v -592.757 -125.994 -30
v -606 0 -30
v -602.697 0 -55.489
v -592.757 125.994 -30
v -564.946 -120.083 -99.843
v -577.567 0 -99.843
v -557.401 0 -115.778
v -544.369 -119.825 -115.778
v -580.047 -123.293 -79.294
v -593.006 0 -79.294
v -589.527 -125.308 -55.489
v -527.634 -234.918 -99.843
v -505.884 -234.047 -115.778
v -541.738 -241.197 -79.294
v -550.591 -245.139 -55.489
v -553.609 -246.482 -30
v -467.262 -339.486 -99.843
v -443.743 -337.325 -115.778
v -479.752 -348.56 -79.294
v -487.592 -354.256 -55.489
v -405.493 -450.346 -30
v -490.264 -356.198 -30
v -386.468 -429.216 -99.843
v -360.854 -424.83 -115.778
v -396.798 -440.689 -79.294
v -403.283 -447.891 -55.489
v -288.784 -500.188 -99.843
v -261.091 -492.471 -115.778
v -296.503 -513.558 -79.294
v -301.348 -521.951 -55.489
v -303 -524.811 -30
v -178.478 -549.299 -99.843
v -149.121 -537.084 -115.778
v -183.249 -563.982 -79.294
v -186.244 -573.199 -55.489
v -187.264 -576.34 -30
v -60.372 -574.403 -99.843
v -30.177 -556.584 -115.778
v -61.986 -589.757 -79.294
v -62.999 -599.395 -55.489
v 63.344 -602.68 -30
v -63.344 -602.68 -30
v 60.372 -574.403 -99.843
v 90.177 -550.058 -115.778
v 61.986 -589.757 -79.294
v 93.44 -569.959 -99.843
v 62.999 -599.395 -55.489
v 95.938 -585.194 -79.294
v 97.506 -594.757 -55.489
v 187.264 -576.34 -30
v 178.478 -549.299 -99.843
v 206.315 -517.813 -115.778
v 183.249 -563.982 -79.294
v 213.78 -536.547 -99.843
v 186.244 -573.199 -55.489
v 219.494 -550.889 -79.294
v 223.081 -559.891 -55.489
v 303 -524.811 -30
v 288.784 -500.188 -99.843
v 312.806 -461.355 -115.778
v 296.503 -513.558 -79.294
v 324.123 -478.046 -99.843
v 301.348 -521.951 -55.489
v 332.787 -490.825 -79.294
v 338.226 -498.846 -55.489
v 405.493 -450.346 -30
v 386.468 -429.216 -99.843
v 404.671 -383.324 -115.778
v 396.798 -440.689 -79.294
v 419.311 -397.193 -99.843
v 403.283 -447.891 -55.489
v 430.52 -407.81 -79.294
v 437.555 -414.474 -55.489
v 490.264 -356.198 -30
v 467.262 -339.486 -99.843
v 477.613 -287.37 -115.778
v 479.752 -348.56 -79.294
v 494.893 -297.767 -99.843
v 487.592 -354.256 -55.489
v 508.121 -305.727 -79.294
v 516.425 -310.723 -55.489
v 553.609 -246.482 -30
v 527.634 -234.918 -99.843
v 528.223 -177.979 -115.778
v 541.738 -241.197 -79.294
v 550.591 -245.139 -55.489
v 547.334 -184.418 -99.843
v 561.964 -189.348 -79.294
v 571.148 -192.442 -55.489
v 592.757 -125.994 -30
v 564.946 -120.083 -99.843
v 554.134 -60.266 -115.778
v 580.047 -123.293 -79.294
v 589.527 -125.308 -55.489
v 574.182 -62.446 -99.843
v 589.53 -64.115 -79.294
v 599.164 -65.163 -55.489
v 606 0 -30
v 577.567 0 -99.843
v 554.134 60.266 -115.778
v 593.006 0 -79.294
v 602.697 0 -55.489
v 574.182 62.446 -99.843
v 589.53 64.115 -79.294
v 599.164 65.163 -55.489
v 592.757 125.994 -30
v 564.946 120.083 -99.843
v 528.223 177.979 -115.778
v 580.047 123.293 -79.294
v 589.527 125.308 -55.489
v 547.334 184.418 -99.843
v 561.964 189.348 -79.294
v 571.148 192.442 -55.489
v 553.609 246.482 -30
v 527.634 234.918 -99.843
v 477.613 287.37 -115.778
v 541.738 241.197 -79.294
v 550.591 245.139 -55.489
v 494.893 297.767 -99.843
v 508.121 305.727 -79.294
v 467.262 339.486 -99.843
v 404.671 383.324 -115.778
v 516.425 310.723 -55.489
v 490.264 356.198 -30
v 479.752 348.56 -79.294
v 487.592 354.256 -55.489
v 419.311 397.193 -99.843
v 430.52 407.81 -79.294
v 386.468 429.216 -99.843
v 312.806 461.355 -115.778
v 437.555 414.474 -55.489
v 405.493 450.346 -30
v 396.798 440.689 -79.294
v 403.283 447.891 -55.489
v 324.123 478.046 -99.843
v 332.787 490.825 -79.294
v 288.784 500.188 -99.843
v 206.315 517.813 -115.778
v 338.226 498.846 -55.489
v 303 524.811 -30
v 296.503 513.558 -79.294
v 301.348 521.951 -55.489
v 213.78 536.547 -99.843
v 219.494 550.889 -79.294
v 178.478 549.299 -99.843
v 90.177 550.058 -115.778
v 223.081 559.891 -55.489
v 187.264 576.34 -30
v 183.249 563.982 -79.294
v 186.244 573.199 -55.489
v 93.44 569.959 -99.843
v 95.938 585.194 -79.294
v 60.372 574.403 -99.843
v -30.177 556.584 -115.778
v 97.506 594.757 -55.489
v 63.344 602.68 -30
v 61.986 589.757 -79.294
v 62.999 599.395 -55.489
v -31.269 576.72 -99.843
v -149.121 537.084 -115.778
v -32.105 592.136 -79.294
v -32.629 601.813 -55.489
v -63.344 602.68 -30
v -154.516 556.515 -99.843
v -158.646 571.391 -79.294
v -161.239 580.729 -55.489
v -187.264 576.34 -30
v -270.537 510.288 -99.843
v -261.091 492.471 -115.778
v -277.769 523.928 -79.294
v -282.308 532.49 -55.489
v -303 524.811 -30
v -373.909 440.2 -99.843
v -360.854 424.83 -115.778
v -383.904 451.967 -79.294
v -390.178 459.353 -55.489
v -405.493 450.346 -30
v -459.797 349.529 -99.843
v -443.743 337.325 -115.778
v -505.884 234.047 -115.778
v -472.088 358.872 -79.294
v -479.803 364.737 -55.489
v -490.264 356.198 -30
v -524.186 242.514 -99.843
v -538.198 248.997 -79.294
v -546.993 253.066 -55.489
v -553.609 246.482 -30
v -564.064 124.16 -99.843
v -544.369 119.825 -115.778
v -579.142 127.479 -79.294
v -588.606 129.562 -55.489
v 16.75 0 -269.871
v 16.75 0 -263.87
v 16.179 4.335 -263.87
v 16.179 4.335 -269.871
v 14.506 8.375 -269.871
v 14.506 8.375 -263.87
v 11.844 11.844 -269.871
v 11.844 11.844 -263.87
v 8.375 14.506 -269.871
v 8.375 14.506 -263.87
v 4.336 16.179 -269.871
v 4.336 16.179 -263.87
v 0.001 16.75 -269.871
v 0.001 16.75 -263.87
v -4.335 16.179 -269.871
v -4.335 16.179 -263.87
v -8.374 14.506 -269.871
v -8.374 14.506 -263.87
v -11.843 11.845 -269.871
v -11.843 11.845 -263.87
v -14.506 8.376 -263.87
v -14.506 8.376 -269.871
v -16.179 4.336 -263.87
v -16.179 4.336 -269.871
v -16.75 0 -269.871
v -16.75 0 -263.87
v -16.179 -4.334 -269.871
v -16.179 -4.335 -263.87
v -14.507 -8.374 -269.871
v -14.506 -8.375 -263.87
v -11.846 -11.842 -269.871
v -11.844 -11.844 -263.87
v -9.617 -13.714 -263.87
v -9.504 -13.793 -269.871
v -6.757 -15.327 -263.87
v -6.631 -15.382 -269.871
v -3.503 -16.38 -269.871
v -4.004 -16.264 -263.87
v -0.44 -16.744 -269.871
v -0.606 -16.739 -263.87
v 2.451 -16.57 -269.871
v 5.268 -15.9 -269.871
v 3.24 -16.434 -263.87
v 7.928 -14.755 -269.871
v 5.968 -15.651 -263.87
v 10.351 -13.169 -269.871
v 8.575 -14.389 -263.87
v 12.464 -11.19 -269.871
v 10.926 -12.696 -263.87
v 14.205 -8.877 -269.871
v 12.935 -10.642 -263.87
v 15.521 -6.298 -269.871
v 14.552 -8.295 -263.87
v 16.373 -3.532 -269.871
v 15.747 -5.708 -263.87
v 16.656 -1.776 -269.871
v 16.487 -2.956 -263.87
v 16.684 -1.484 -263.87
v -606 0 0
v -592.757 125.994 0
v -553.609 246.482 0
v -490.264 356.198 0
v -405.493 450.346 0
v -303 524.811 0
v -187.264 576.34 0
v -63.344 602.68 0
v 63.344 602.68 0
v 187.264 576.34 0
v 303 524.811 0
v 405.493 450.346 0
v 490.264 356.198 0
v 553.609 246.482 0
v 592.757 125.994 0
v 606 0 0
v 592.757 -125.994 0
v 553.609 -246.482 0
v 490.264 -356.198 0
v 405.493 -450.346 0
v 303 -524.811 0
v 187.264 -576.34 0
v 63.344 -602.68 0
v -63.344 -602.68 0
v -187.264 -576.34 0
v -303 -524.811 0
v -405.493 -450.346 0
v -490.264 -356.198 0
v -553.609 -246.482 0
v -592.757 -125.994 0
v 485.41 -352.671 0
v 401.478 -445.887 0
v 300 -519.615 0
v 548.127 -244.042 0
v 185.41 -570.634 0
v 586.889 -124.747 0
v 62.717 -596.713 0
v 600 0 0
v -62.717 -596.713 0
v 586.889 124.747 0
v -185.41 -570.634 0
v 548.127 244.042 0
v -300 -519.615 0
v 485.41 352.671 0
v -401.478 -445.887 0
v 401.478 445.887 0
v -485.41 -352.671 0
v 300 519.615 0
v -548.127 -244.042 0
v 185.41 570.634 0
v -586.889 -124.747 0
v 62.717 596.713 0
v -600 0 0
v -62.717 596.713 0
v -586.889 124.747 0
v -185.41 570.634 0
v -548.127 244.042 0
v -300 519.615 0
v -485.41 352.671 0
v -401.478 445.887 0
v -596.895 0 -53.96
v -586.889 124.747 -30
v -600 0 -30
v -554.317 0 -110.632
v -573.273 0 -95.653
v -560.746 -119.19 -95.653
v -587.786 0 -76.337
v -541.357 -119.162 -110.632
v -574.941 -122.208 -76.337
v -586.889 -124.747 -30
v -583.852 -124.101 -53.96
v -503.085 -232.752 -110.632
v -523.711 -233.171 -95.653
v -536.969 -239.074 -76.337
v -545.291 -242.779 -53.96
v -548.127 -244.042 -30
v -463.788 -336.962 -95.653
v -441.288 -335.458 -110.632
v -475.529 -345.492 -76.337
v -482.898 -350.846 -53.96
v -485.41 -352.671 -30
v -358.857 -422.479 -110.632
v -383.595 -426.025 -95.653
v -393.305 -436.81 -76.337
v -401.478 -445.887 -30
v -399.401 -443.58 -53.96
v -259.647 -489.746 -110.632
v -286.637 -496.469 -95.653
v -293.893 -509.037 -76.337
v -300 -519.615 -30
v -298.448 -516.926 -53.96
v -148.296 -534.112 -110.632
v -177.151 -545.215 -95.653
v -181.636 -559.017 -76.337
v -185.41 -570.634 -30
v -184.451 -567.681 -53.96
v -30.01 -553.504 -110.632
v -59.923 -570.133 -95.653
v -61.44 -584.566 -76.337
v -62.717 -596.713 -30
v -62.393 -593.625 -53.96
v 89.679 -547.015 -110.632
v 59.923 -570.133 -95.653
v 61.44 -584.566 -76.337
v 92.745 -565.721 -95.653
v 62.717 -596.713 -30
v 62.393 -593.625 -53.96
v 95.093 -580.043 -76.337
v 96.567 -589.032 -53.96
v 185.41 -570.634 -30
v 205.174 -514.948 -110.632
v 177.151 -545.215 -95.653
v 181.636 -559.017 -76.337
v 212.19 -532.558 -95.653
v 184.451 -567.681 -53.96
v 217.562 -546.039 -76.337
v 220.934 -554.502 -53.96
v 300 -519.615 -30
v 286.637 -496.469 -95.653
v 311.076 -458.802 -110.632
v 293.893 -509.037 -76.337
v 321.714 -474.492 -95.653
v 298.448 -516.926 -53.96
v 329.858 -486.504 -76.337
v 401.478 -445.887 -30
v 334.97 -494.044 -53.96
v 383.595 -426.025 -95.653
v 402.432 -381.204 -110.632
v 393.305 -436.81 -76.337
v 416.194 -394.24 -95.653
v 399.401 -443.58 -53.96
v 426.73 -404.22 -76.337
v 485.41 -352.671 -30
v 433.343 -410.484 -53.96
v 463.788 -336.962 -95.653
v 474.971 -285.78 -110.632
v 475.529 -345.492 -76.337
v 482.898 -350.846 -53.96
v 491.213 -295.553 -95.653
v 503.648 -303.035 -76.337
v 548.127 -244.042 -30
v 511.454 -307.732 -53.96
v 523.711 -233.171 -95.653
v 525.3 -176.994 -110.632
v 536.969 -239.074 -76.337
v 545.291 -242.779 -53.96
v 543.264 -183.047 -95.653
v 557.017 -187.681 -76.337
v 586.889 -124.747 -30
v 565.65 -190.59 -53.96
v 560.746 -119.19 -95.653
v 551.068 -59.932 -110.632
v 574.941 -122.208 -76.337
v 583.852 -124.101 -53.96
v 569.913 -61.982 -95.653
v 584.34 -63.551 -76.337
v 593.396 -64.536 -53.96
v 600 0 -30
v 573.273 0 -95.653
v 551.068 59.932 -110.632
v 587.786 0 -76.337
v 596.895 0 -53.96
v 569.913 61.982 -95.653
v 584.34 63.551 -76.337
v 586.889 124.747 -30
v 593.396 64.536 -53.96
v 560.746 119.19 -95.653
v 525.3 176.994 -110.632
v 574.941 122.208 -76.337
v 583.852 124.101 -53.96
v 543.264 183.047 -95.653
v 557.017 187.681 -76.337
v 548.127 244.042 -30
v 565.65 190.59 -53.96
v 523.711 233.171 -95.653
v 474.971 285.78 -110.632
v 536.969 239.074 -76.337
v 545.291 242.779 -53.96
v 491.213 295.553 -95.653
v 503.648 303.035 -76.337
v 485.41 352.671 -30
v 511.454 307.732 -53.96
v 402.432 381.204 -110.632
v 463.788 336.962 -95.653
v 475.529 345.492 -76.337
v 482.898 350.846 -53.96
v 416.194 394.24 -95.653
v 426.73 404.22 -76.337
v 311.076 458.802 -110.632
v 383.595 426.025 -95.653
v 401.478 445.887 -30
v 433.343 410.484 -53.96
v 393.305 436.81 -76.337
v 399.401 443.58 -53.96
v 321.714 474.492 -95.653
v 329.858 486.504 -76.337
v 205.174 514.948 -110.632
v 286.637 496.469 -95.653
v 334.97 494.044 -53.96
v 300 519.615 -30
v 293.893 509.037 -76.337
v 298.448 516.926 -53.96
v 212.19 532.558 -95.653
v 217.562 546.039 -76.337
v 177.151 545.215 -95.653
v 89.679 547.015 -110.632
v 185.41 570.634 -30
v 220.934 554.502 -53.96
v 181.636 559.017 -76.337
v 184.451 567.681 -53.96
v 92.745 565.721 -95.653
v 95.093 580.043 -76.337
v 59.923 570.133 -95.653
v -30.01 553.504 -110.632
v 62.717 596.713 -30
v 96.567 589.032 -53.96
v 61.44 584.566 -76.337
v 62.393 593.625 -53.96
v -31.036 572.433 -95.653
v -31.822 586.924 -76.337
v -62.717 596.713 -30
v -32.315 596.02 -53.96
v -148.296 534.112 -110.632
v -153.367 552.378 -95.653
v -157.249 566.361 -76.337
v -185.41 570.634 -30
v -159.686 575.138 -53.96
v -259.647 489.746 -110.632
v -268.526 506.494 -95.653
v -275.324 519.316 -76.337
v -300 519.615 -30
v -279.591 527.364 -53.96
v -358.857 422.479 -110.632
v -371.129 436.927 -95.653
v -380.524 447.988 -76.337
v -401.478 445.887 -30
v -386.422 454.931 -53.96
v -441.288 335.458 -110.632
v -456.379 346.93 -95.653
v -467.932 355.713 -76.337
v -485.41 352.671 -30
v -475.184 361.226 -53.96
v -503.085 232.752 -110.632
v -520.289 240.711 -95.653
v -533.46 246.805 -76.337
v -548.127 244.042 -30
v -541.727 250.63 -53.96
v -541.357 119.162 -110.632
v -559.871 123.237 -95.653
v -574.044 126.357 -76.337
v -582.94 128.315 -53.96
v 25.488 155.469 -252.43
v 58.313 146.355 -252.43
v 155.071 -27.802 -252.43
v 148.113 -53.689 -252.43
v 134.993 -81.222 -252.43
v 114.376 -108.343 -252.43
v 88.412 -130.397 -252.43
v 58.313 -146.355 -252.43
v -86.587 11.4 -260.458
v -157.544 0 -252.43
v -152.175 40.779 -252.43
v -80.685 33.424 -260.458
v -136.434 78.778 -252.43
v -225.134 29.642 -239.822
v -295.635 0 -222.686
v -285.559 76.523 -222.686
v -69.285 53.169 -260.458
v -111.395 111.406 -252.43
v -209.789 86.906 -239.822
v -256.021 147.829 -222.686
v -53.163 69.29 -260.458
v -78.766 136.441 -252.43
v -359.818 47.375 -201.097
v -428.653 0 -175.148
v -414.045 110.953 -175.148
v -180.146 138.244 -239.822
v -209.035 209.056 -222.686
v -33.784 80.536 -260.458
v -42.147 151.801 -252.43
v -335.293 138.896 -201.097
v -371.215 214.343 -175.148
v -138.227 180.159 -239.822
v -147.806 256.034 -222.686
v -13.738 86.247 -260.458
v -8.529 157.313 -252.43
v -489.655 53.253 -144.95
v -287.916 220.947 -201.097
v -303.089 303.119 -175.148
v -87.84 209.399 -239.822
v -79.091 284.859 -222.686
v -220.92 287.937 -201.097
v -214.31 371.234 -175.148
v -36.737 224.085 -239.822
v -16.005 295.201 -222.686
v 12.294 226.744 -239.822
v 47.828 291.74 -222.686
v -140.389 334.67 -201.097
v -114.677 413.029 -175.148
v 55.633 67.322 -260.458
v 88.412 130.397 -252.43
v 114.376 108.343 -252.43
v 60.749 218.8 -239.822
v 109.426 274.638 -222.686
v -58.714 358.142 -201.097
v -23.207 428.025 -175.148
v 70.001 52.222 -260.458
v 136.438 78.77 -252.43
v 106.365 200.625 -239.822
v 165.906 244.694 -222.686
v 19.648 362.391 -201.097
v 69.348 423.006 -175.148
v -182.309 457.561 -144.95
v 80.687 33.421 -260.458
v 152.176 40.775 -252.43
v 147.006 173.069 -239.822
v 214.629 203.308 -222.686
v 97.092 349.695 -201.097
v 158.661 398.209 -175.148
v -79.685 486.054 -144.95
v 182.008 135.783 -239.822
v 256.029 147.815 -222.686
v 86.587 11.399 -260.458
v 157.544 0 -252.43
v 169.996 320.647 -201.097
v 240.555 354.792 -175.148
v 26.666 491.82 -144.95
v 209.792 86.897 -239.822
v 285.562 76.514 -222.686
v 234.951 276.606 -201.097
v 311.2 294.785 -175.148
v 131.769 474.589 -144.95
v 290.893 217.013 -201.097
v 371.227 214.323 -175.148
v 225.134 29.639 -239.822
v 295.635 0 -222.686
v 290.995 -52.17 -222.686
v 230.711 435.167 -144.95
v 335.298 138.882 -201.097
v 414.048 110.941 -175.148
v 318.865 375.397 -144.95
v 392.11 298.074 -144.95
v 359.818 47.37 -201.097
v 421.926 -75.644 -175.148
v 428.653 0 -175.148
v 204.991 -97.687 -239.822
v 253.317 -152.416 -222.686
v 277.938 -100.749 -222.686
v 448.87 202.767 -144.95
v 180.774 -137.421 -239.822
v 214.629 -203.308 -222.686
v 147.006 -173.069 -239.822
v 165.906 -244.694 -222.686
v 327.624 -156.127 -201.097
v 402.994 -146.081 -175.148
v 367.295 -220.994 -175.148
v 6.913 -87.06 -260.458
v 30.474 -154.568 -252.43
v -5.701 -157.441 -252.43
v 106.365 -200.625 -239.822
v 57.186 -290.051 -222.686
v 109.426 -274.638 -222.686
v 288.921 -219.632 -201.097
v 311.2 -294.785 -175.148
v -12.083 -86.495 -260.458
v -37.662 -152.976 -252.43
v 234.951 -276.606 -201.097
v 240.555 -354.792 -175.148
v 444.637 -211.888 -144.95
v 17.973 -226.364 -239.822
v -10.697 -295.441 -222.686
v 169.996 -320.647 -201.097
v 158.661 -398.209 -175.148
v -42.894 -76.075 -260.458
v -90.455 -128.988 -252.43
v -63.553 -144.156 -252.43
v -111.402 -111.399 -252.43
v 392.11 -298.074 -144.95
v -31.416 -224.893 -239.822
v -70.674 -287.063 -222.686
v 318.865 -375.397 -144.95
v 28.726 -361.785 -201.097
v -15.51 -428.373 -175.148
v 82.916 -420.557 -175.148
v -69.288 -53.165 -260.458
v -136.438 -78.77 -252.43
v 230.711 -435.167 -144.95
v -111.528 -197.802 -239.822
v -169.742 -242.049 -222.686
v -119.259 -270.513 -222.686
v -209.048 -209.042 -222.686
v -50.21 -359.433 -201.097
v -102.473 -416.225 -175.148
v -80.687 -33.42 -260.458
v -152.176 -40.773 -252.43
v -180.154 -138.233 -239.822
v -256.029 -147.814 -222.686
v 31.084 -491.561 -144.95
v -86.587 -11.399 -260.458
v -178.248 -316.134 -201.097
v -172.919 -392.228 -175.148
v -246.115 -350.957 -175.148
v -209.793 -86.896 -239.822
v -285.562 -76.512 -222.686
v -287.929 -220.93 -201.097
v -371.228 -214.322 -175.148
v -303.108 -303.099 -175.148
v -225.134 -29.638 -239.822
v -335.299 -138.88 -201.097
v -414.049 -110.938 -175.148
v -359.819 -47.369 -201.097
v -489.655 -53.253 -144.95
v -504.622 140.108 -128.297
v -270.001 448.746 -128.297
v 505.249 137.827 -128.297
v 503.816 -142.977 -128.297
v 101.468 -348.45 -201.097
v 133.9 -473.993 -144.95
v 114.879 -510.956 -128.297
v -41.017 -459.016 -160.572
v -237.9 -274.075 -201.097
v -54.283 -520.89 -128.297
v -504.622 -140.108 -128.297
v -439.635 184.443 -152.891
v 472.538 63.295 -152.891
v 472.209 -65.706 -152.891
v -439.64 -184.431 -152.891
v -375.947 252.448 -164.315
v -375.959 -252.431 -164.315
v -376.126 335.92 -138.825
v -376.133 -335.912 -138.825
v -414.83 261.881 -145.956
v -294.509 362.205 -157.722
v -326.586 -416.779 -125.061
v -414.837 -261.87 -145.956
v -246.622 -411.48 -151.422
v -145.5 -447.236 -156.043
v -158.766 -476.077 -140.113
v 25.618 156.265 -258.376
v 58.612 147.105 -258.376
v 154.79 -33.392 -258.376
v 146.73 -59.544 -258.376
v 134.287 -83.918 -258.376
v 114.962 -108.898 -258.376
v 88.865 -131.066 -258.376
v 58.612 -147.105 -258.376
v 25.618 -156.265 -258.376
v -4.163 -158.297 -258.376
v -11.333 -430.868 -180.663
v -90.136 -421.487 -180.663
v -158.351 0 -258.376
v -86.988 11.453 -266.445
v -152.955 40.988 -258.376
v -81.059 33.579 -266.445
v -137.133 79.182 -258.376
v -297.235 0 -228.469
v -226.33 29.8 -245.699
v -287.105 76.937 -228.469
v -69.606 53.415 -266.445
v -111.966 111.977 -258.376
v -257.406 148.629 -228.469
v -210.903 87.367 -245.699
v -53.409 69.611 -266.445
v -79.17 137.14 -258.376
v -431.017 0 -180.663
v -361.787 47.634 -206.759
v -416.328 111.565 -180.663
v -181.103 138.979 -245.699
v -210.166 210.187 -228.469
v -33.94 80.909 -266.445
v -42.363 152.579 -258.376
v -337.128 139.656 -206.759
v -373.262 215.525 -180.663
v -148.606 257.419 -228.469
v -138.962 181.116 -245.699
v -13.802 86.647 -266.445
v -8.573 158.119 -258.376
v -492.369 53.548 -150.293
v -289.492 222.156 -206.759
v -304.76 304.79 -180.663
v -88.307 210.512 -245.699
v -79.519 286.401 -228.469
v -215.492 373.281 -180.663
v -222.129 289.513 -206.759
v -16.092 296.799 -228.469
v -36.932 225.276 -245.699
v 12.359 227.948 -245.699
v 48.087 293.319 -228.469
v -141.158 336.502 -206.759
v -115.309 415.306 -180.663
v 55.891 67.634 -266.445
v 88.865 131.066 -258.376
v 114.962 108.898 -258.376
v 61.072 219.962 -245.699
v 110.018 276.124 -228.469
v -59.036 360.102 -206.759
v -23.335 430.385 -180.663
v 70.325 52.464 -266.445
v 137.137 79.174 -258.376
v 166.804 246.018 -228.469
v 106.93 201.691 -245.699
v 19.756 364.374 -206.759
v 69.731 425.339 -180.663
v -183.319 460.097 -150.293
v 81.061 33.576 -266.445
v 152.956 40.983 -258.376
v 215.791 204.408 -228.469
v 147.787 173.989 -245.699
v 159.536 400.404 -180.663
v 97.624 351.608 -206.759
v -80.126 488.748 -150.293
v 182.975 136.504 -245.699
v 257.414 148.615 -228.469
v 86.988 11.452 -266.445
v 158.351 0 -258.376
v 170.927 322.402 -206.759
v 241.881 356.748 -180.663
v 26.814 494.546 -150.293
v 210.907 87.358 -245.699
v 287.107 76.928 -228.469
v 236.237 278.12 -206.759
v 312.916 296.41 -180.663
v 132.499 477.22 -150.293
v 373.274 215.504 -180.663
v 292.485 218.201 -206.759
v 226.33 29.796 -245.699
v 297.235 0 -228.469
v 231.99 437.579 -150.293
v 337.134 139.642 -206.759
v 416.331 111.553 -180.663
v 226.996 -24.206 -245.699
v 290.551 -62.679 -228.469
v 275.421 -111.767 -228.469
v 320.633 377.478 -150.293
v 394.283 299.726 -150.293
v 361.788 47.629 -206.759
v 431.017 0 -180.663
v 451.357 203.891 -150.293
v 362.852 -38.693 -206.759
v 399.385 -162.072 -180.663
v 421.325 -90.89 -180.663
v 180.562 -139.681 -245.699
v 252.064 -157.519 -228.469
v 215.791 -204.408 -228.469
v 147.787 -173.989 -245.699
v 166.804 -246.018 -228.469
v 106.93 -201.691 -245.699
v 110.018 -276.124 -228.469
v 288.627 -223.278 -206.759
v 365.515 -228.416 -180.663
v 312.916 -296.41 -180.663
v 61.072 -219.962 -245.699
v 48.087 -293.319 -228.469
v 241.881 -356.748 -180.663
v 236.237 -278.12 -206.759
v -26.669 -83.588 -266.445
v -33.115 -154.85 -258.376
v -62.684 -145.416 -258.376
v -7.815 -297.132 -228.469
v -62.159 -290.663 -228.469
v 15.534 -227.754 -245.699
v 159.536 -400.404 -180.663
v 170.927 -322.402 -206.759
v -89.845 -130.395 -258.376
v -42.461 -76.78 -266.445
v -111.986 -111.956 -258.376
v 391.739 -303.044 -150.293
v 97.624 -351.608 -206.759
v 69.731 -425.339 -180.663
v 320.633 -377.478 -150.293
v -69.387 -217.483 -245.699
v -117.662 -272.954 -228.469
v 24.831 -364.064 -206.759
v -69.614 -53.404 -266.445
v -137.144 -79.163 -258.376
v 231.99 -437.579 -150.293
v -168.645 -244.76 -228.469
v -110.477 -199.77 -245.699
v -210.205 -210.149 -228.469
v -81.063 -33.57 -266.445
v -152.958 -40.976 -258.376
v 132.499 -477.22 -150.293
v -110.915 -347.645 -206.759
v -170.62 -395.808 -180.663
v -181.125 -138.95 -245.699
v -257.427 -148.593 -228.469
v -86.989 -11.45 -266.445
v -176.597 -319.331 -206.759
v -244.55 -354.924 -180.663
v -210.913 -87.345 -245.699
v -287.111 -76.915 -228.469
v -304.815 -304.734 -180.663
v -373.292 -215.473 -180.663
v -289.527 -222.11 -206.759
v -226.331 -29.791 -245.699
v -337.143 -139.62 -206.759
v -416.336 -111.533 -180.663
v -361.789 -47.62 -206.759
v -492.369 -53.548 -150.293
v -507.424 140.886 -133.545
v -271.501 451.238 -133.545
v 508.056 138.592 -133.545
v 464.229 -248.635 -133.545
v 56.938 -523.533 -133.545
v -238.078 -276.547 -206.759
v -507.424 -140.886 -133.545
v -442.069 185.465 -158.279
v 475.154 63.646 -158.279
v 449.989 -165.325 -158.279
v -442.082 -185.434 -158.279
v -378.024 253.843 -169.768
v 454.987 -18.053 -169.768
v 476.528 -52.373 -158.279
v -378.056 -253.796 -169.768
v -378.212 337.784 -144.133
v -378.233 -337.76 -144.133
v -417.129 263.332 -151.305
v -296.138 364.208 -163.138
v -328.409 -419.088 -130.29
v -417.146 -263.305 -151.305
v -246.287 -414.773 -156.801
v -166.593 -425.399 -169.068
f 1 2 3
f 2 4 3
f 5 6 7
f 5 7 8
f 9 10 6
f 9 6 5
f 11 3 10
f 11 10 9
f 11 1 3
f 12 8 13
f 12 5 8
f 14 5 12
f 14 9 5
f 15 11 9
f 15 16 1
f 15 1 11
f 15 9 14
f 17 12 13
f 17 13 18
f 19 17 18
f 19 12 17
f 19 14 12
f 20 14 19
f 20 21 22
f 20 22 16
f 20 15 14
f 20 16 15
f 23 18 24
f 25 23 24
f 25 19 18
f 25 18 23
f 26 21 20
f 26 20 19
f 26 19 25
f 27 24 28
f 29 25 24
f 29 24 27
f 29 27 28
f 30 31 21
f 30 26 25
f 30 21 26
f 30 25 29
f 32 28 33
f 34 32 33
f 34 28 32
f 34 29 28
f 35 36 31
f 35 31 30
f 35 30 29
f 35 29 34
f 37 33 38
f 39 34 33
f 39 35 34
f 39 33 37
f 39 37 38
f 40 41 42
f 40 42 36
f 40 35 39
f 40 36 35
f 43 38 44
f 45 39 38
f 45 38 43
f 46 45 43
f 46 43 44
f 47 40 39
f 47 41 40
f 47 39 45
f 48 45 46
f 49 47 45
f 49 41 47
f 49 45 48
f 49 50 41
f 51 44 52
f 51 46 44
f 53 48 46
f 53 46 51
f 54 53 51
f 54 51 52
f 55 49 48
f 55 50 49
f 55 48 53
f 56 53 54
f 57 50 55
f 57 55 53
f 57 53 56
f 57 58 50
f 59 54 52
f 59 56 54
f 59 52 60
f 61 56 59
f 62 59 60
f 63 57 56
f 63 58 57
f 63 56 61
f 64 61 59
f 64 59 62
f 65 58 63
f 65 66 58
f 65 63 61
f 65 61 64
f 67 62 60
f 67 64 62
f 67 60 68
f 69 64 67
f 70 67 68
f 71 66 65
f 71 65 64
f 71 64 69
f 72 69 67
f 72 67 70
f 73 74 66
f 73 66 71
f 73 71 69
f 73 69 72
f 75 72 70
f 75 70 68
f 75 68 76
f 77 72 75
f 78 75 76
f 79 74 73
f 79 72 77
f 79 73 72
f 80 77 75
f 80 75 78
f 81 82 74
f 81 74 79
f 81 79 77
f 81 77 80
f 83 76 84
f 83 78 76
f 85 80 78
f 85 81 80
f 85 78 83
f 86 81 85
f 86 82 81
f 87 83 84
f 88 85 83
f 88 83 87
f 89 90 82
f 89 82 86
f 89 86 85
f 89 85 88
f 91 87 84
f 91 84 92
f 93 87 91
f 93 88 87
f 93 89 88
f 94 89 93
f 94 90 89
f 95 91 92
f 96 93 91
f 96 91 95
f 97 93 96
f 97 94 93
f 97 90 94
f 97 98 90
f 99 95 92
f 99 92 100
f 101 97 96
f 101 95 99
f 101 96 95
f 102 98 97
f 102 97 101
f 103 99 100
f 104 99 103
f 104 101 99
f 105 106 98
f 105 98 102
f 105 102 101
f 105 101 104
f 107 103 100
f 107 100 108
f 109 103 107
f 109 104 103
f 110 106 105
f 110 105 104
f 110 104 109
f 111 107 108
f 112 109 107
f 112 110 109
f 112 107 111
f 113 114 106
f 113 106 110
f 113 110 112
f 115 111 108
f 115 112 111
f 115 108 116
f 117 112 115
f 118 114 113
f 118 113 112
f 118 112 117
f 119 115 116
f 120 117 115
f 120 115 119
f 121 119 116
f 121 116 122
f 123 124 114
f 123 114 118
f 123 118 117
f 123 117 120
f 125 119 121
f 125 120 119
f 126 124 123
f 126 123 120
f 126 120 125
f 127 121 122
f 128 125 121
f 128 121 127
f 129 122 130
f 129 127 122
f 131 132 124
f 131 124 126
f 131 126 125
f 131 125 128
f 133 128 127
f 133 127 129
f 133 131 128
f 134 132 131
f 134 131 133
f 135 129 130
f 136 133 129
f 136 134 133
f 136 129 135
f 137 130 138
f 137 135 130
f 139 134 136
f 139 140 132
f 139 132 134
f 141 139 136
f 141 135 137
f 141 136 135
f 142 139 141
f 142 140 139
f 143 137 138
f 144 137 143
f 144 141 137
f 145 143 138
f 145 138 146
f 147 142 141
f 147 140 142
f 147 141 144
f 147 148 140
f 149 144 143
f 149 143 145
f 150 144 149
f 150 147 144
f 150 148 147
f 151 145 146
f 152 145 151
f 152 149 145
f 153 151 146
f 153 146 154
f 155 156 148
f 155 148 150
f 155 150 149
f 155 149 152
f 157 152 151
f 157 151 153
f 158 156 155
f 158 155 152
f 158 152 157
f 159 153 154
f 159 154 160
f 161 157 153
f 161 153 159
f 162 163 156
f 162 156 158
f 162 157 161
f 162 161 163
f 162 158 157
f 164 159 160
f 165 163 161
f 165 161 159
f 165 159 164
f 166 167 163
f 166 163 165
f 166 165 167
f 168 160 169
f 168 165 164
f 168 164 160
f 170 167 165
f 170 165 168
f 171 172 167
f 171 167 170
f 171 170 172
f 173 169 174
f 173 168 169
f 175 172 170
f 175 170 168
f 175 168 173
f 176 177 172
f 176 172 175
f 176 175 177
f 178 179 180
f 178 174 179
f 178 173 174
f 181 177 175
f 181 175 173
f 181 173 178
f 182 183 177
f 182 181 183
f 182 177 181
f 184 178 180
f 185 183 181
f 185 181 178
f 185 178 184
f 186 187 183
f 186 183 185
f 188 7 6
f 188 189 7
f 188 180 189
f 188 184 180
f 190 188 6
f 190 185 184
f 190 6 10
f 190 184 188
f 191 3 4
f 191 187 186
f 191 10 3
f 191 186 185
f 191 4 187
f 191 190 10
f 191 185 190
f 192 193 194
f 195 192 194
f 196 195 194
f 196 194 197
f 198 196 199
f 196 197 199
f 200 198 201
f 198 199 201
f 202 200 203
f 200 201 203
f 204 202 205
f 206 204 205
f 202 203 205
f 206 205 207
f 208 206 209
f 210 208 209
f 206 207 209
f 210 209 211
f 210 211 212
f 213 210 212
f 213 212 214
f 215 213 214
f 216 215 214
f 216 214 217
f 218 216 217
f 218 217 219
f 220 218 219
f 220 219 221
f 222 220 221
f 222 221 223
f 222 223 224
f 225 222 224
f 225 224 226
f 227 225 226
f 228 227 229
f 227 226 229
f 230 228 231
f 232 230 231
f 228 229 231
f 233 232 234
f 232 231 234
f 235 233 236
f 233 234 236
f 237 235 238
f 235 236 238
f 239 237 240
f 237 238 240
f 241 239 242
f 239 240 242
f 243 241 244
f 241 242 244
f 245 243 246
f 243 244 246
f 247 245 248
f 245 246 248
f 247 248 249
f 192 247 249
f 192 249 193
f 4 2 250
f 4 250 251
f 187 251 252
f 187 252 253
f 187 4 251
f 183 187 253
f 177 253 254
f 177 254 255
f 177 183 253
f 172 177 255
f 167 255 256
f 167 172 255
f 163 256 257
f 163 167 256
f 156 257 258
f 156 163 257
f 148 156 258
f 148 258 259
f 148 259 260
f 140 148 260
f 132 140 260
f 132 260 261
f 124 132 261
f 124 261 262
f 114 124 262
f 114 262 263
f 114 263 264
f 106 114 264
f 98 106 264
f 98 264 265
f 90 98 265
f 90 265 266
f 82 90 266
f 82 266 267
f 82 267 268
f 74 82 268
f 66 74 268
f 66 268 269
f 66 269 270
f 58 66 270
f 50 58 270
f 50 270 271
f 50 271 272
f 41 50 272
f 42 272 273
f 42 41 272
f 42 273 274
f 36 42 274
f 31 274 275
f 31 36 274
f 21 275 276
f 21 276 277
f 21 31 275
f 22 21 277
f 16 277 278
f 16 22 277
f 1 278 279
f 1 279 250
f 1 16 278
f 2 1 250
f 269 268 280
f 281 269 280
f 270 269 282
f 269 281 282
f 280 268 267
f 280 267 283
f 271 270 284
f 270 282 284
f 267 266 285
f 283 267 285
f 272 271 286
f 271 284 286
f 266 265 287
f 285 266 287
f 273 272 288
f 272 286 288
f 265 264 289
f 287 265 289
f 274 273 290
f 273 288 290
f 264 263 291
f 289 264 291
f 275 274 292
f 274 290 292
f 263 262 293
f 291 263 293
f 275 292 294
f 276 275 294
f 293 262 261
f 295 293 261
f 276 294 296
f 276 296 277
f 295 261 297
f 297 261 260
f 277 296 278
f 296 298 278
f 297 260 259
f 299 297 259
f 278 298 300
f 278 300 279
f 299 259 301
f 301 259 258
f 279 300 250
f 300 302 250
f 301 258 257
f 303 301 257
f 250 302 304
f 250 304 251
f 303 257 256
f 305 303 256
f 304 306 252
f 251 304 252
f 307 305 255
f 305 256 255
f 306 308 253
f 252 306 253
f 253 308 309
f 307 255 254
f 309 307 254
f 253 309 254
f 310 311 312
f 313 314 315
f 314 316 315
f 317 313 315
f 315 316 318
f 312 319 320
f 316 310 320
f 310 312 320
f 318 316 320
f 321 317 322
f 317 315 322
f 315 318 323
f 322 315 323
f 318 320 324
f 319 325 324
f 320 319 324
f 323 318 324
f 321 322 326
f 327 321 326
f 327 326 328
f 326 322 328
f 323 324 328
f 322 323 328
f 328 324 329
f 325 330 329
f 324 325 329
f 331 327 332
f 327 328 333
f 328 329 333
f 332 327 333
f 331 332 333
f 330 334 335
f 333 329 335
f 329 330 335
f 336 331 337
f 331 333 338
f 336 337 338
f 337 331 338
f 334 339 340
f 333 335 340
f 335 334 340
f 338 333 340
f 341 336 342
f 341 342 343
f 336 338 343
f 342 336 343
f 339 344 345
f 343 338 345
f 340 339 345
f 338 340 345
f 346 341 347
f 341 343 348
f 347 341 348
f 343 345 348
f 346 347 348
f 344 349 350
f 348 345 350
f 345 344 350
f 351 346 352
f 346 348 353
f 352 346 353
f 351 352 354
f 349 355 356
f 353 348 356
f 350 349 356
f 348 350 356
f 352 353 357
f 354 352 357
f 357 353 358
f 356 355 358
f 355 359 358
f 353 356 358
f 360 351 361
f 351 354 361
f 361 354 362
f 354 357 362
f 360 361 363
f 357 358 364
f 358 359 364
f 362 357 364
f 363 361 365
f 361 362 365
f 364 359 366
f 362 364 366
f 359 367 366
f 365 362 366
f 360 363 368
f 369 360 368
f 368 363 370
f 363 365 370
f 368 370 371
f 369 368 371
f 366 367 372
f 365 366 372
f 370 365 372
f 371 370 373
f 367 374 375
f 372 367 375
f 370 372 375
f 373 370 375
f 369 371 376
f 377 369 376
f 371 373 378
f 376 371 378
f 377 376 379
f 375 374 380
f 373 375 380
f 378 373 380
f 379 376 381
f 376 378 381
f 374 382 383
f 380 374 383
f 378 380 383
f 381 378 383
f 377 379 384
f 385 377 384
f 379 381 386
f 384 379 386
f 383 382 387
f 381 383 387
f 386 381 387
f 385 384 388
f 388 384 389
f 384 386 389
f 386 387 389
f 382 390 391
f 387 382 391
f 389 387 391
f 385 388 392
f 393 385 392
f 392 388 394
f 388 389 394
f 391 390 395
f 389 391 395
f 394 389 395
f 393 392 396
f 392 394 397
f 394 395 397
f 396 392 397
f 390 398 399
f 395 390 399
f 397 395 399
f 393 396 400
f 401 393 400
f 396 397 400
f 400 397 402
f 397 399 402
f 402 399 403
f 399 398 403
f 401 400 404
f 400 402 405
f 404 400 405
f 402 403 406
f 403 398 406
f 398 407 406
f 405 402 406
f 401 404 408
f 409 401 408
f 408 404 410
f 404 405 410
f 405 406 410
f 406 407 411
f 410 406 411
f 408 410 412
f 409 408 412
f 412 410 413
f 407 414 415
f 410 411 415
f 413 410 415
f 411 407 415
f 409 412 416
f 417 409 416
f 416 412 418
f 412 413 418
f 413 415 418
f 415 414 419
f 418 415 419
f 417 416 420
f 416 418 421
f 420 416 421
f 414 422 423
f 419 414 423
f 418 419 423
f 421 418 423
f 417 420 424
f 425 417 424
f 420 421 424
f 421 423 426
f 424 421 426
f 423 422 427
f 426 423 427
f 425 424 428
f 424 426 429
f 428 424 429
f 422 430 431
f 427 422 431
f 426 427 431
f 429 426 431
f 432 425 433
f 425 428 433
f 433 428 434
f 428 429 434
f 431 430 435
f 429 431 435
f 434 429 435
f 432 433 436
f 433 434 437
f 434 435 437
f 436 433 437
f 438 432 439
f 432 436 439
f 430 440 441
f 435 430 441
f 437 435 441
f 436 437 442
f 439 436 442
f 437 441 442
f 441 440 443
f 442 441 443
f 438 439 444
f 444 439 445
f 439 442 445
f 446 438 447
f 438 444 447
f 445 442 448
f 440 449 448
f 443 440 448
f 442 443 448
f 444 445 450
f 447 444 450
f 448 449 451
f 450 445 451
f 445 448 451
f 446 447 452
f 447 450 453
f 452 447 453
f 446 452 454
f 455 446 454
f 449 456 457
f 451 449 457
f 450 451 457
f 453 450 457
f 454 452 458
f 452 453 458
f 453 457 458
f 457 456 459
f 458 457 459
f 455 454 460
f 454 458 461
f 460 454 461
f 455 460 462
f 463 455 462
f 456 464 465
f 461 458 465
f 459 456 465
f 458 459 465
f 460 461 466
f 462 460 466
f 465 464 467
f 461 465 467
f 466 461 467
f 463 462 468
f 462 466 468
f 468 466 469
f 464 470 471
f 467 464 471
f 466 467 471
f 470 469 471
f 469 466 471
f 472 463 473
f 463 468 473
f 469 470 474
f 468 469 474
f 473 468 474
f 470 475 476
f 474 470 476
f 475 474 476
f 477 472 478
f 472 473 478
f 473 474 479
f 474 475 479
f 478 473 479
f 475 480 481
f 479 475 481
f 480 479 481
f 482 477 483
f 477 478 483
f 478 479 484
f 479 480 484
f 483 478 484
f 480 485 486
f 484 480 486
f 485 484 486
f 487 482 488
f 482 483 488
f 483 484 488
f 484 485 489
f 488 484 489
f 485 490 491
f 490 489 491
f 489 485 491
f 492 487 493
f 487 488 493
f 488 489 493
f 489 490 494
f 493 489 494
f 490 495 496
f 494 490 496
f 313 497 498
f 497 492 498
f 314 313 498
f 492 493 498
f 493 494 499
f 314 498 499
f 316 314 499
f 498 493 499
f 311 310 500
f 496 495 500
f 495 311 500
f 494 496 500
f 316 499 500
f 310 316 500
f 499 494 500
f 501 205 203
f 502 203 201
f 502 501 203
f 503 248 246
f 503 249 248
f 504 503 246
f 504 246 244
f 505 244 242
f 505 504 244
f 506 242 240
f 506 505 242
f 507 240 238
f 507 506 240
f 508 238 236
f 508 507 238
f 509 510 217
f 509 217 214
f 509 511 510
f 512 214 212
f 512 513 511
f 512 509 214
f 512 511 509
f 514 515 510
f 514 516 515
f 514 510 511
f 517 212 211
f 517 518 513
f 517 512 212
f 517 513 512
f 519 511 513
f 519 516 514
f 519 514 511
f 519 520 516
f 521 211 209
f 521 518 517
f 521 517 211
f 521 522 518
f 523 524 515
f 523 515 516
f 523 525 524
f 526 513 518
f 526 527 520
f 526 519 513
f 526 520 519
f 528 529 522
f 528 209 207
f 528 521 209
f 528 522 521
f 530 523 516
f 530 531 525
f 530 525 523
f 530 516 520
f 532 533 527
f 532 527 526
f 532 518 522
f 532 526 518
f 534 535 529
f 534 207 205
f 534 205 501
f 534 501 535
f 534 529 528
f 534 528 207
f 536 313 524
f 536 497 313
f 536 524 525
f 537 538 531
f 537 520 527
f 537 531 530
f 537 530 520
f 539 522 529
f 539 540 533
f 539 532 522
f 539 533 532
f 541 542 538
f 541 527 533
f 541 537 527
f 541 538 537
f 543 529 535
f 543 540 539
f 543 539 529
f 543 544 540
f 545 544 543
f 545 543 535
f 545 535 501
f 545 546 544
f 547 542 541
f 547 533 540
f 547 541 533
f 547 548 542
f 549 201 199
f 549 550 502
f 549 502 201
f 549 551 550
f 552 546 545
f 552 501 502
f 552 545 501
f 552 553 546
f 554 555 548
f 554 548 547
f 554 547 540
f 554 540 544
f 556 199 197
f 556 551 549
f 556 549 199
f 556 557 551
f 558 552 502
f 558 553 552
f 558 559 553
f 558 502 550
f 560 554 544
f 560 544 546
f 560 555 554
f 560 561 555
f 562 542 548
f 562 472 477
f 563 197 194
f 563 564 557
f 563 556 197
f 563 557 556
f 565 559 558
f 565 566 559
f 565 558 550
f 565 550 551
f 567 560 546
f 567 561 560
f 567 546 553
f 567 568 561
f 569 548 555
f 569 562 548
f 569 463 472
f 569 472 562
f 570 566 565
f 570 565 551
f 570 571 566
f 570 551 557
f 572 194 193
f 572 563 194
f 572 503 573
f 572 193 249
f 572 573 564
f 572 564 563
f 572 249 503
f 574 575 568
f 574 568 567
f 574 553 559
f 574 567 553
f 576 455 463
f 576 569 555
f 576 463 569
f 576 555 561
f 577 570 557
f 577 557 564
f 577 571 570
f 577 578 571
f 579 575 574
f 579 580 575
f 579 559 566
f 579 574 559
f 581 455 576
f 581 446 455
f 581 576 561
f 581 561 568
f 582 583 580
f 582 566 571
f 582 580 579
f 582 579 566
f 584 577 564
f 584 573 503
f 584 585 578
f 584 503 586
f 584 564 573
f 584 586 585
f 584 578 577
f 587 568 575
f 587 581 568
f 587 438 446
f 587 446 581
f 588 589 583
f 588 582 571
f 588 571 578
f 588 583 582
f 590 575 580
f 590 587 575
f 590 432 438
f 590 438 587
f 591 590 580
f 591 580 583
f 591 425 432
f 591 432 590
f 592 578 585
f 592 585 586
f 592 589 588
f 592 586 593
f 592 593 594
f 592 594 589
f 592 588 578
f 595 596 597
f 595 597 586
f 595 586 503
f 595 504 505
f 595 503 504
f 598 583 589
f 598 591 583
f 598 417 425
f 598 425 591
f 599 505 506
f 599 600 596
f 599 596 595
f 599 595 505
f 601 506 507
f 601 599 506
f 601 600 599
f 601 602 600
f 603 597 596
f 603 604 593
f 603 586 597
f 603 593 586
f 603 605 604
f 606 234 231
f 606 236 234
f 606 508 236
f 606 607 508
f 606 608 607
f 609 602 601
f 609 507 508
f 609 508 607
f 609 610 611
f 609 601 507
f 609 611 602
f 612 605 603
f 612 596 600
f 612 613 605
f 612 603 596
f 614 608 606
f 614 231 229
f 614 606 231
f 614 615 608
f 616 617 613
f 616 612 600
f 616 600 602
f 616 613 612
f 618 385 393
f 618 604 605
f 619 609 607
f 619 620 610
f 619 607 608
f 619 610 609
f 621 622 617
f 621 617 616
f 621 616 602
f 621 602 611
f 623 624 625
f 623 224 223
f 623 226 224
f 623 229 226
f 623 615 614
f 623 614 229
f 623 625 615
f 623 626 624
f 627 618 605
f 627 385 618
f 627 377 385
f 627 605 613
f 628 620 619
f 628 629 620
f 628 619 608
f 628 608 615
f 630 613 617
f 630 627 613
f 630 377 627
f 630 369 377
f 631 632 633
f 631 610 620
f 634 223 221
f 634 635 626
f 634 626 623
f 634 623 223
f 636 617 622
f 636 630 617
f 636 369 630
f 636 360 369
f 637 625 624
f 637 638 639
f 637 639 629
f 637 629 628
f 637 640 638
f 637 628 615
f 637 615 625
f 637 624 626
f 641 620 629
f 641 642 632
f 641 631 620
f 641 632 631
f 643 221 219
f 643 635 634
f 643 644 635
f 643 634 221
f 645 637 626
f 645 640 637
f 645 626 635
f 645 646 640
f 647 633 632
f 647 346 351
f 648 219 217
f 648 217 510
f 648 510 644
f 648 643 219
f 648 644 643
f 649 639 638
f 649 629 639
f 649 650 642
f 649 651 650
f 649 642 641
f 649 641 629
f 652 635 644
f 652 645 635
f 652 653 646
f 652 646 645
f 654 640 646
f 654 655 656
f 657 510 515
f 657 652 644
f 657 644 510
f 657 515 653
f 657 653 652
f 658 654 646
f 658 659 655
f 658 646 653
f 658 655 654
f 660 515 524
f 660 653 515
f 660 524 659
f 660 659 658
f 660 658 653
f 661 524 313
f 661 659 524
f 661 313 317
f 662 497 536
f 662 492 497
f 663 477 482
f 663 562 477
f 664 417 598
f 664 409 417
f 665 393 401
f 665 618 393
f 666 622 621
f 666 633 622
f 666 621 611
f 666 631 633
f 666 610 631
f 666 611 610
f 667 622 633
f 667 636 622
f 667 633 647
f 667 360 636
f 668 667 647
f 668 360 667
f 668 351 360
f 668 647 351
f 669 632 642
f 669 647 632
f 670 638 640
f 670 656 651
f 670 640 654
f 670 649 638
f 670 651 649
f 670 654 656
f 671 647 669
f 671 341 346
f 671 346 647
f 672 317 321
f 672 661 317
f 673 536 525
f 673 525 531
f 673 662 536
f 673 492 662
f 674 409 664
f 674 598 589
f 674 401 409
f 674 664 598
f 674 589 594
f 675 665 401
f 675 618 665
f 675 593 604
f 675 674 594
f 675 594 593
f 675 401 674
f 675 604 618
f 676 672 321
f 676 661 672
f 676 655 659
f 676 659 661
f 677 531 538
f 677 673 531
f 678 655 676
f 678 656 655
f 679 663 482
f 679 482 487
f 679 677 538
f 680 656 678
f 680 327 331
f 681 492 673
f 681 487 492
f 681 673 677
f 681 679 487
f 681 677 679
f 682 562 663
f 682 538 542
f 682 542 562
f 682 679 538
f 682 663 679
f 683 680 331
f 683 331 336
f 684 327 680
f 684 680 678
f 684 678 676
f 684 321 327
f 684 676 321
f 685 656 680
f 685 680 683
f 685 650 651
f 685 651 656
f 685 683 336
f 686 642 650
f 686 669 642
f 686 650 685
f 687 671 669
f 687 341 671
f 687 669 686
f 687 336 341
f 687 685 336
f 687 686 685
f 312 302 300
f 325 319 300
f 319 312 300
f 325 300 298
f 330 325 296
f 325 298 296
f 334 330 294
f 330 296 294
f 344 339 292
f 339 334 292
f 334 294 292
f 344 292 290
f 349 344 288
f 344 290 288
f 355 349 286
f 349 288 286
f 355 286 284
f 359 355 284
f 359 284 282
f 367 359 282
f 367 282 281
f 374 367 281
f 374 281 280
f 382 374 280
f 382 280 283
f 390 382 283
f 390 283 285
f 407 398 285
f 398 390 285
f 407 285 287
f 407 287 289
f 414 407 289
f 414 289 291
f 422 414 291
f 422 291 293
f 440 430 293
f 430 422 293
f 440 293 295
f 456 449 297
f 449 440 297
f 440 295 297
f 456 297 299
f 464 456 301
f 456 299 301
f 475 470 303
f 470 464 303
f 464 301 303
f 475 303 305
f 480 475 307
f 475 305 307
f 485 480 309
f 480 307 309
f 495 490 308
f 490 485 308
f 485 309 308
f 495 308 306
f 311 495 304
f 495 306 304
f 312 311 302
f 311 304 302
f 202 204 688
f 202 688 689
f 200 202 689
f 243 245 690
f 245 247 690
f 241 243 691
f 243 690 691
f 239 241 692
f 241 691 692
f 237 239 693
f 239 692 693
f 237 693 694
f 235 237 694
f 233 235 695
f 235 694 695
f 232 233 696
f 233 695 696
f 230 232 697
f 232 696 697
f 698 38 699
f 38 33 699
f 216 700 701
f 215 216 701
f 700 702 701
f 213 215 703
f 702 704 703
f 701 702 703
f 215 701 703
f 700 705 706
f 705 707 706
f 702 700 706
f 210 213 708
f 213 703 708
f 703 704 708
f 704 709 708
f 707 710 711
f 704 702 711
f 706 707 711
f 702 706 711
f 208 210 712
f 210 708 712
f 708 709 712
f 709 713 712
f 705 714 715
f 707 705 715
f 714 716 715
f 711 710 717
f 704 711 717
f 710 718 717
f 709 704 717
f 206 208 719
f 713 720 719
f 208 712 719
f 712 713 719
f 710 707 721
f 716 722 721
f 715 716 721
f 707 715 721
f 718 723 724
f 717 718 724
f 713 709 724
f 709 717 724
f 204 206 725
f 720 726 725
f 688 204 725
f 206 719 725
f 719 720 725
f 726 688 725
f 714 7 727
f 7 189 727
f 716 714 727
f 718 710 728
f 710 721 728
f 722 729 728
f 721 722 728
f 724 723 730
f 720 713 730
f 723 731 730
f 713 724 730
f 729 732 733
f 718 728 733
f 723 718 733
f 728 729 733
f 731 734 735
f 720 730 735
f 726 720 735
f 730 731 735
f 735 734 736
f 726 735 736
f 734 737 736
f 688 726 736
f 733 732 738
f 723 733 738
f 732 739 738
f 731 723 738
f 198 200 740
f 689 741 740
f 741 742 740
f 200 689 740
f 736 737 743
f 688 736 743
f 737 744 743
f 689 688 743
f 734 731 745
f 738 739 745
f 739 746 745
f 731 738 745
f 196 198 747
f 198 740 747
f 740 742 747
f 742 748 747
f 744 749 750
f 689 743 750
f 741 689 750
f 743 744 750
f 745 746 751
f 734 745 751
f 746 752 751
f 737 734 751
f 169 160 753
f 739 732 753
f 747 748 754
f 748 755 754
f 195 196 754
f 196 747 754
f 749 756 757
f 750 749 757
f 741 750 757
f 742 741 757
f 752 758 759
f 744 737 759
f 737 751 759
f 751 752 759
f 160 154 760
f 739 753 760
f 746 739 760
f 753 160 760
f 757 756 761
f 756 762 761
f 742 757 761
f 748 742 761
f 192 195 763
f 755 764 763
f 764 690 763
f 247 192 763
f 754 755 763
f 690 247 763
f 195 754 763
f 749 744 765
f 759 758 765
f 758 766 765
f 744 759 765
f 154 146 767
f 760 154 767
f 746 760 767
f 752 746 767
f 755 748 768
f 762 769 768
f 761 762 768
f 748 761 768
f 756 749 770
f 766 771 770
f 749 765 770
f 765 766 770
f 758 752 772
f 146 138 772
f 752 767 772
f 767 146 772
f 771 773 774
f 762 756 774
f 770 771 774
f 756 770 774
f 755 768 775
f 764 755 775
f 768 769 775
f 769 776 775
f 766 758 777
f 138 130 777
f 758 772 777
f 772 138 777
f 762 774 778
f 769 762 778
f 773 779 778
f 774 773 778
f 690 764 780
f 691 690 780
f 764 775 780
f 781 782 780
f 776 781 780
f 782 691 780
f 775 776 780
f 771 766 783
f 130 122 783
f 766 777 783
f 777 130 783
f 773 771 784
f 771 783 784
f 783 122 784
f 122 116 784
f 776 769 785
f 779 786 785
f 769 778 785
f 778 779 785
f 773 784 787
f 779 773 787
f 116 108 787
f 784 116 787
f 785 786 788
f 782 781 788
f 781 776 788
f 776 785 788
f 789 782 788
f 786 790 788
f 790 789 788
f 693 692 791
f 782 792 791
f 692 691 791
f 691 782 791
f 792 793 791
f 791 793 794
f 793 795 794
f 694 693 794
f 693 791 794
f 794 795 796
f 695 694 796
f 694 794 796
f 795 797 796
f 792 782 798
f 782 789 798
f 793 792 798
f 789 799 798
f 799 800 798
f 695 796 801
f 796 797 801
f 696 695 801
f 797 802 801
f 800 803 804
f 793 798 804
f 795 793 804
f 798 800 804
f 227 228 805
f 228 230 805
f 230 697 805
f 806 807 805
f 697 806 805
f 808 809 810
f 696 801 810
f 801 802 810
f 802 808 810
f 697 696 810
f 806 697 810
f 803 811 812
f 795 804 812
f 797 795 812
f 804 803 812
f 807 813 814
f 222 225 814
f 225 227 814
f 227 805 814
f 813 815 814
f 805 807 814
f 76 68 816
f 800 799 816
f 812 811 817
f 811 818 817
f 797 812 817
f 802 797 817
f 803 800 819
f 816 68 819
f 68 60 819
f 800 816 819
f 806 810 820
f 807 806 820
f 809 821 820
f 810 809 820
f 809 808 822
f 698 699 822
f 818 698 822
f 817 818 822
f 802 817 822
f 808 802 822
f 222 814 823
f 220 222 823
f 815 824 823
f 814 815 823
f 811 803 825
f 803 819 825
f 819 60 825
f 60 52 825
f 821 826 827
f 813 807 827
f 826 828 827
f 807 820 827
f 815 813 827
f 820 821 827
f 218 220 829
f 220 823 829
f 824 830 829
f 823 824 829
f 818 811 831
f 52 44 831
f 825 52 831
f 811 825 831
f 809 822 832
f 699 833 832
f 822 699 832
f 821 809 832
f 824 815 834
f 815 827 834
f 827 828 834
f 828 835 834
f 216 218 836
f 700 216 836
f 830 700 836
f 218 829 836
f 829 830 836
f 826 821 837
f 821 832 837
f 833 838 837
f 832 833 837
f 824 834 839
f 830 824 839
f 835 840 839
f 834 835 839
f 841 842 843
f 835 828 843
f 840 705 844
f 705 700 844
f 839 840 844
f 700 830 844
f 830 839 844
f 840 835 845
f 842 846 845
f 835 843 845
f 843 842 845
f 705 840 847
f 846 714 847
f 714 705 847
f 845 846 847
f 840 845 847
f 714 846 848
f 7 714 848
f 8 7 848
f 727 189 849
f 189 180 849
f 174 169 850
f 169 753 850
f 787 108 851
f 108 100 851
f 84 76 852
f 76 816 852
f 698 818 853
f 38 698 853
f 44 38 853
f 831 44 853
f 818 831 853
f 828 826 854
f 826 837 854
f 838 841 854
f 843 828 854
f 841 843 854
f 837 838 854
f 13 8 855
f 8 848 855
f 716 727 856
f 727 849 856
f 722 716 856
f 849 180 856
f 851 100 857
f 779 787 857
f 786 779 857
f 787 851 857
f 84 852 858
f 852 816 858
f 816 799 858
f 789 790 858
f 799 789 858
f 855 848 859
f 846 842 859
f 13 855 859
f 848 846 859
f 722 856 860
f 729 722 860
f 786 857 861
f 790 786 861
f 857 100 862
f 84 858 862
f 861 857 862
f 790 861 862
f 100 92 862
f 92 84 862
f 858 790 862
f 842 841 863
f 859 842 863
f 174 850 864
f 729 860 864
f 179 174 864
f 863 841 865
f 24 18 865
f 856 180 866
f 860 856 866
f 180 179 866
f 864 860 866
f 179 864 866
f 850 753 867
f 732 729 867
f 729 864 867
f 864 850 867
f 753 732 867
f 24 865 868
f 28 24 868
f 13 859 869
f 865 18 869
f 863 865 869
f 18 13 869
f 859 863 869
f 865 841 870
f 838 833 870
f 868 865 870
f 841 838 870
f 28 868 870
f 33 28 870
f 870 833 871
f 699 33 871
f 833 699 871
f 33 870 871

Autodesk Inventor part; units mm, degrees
ref_plane "YZ Plane" through (0, 0, 0) normal (1, 0, 0) x (0, 1, 0)
ref_plane "XZ Plane" through (0, 0, 0) normal (0, 1, 0) x (-1, 0, 0)
ref_plane "XY Plane" through (0, 0, 0) normal (0, 0, 1) x (1, 0, 0)
sketch "Sketch1" plane through (0, 0, 0) normal (0, 1, 0) x (-1, 0, 0)
  line L0 (606, 0) -> (606, -30)
  arc A0 (557.4011, -115.7783) -> (606, -30) centre (506, -30) ccw
  arc A1 (0, -270) -> (557.4011, -115.7783) centre (0, 814.4143) ccw
  line L1 (0, 191.6842) -> (0, -191.6842)
  arc A2 (0, -264) -> (554.3171, -110.6316) centre (0, 814.4143) ccw
  arc A3 (554.3171, -110.6316) -> (600, -30) centre (506, -30) ccw
  line L2 (600, -30) -> (600, 0)
  line L3 (600, 0) -> (606, 0)
  line L4 (0, -264) -> (0, -270)
  point P0 (0, 0)
  point P1 (0, 0)
  point P2 (0, -267)
  point P3 (0, -163.7009)
  point P4 (0, -169.7009)
  dimension "d0" = 100
  dimension "d1" = 30
  dimension "d3" = 1084.4143
  dimension "d6" = 6
  dimension "d11" = 1200
  dimension "d12" = 270
revolve "Revolution1" add sketch "Sketch1" angle 360 about axis through (0, 0, 191.6842) along (0, 0, -1)
sketch "Sketch2" plane through (0, 0, 0) normal (0, 0, 1) x (1, 0, 0)
  circle A0 centre (0, 0) radius 16.75
  dimension "d8" = 33.5
extrude "Extrusion1" cut sketch "Sketch2" against normal through all
equation "\"Disherd_head_hight\" = d12"
properties part number "PNV - 704 dished head D1200" material "Steel"
